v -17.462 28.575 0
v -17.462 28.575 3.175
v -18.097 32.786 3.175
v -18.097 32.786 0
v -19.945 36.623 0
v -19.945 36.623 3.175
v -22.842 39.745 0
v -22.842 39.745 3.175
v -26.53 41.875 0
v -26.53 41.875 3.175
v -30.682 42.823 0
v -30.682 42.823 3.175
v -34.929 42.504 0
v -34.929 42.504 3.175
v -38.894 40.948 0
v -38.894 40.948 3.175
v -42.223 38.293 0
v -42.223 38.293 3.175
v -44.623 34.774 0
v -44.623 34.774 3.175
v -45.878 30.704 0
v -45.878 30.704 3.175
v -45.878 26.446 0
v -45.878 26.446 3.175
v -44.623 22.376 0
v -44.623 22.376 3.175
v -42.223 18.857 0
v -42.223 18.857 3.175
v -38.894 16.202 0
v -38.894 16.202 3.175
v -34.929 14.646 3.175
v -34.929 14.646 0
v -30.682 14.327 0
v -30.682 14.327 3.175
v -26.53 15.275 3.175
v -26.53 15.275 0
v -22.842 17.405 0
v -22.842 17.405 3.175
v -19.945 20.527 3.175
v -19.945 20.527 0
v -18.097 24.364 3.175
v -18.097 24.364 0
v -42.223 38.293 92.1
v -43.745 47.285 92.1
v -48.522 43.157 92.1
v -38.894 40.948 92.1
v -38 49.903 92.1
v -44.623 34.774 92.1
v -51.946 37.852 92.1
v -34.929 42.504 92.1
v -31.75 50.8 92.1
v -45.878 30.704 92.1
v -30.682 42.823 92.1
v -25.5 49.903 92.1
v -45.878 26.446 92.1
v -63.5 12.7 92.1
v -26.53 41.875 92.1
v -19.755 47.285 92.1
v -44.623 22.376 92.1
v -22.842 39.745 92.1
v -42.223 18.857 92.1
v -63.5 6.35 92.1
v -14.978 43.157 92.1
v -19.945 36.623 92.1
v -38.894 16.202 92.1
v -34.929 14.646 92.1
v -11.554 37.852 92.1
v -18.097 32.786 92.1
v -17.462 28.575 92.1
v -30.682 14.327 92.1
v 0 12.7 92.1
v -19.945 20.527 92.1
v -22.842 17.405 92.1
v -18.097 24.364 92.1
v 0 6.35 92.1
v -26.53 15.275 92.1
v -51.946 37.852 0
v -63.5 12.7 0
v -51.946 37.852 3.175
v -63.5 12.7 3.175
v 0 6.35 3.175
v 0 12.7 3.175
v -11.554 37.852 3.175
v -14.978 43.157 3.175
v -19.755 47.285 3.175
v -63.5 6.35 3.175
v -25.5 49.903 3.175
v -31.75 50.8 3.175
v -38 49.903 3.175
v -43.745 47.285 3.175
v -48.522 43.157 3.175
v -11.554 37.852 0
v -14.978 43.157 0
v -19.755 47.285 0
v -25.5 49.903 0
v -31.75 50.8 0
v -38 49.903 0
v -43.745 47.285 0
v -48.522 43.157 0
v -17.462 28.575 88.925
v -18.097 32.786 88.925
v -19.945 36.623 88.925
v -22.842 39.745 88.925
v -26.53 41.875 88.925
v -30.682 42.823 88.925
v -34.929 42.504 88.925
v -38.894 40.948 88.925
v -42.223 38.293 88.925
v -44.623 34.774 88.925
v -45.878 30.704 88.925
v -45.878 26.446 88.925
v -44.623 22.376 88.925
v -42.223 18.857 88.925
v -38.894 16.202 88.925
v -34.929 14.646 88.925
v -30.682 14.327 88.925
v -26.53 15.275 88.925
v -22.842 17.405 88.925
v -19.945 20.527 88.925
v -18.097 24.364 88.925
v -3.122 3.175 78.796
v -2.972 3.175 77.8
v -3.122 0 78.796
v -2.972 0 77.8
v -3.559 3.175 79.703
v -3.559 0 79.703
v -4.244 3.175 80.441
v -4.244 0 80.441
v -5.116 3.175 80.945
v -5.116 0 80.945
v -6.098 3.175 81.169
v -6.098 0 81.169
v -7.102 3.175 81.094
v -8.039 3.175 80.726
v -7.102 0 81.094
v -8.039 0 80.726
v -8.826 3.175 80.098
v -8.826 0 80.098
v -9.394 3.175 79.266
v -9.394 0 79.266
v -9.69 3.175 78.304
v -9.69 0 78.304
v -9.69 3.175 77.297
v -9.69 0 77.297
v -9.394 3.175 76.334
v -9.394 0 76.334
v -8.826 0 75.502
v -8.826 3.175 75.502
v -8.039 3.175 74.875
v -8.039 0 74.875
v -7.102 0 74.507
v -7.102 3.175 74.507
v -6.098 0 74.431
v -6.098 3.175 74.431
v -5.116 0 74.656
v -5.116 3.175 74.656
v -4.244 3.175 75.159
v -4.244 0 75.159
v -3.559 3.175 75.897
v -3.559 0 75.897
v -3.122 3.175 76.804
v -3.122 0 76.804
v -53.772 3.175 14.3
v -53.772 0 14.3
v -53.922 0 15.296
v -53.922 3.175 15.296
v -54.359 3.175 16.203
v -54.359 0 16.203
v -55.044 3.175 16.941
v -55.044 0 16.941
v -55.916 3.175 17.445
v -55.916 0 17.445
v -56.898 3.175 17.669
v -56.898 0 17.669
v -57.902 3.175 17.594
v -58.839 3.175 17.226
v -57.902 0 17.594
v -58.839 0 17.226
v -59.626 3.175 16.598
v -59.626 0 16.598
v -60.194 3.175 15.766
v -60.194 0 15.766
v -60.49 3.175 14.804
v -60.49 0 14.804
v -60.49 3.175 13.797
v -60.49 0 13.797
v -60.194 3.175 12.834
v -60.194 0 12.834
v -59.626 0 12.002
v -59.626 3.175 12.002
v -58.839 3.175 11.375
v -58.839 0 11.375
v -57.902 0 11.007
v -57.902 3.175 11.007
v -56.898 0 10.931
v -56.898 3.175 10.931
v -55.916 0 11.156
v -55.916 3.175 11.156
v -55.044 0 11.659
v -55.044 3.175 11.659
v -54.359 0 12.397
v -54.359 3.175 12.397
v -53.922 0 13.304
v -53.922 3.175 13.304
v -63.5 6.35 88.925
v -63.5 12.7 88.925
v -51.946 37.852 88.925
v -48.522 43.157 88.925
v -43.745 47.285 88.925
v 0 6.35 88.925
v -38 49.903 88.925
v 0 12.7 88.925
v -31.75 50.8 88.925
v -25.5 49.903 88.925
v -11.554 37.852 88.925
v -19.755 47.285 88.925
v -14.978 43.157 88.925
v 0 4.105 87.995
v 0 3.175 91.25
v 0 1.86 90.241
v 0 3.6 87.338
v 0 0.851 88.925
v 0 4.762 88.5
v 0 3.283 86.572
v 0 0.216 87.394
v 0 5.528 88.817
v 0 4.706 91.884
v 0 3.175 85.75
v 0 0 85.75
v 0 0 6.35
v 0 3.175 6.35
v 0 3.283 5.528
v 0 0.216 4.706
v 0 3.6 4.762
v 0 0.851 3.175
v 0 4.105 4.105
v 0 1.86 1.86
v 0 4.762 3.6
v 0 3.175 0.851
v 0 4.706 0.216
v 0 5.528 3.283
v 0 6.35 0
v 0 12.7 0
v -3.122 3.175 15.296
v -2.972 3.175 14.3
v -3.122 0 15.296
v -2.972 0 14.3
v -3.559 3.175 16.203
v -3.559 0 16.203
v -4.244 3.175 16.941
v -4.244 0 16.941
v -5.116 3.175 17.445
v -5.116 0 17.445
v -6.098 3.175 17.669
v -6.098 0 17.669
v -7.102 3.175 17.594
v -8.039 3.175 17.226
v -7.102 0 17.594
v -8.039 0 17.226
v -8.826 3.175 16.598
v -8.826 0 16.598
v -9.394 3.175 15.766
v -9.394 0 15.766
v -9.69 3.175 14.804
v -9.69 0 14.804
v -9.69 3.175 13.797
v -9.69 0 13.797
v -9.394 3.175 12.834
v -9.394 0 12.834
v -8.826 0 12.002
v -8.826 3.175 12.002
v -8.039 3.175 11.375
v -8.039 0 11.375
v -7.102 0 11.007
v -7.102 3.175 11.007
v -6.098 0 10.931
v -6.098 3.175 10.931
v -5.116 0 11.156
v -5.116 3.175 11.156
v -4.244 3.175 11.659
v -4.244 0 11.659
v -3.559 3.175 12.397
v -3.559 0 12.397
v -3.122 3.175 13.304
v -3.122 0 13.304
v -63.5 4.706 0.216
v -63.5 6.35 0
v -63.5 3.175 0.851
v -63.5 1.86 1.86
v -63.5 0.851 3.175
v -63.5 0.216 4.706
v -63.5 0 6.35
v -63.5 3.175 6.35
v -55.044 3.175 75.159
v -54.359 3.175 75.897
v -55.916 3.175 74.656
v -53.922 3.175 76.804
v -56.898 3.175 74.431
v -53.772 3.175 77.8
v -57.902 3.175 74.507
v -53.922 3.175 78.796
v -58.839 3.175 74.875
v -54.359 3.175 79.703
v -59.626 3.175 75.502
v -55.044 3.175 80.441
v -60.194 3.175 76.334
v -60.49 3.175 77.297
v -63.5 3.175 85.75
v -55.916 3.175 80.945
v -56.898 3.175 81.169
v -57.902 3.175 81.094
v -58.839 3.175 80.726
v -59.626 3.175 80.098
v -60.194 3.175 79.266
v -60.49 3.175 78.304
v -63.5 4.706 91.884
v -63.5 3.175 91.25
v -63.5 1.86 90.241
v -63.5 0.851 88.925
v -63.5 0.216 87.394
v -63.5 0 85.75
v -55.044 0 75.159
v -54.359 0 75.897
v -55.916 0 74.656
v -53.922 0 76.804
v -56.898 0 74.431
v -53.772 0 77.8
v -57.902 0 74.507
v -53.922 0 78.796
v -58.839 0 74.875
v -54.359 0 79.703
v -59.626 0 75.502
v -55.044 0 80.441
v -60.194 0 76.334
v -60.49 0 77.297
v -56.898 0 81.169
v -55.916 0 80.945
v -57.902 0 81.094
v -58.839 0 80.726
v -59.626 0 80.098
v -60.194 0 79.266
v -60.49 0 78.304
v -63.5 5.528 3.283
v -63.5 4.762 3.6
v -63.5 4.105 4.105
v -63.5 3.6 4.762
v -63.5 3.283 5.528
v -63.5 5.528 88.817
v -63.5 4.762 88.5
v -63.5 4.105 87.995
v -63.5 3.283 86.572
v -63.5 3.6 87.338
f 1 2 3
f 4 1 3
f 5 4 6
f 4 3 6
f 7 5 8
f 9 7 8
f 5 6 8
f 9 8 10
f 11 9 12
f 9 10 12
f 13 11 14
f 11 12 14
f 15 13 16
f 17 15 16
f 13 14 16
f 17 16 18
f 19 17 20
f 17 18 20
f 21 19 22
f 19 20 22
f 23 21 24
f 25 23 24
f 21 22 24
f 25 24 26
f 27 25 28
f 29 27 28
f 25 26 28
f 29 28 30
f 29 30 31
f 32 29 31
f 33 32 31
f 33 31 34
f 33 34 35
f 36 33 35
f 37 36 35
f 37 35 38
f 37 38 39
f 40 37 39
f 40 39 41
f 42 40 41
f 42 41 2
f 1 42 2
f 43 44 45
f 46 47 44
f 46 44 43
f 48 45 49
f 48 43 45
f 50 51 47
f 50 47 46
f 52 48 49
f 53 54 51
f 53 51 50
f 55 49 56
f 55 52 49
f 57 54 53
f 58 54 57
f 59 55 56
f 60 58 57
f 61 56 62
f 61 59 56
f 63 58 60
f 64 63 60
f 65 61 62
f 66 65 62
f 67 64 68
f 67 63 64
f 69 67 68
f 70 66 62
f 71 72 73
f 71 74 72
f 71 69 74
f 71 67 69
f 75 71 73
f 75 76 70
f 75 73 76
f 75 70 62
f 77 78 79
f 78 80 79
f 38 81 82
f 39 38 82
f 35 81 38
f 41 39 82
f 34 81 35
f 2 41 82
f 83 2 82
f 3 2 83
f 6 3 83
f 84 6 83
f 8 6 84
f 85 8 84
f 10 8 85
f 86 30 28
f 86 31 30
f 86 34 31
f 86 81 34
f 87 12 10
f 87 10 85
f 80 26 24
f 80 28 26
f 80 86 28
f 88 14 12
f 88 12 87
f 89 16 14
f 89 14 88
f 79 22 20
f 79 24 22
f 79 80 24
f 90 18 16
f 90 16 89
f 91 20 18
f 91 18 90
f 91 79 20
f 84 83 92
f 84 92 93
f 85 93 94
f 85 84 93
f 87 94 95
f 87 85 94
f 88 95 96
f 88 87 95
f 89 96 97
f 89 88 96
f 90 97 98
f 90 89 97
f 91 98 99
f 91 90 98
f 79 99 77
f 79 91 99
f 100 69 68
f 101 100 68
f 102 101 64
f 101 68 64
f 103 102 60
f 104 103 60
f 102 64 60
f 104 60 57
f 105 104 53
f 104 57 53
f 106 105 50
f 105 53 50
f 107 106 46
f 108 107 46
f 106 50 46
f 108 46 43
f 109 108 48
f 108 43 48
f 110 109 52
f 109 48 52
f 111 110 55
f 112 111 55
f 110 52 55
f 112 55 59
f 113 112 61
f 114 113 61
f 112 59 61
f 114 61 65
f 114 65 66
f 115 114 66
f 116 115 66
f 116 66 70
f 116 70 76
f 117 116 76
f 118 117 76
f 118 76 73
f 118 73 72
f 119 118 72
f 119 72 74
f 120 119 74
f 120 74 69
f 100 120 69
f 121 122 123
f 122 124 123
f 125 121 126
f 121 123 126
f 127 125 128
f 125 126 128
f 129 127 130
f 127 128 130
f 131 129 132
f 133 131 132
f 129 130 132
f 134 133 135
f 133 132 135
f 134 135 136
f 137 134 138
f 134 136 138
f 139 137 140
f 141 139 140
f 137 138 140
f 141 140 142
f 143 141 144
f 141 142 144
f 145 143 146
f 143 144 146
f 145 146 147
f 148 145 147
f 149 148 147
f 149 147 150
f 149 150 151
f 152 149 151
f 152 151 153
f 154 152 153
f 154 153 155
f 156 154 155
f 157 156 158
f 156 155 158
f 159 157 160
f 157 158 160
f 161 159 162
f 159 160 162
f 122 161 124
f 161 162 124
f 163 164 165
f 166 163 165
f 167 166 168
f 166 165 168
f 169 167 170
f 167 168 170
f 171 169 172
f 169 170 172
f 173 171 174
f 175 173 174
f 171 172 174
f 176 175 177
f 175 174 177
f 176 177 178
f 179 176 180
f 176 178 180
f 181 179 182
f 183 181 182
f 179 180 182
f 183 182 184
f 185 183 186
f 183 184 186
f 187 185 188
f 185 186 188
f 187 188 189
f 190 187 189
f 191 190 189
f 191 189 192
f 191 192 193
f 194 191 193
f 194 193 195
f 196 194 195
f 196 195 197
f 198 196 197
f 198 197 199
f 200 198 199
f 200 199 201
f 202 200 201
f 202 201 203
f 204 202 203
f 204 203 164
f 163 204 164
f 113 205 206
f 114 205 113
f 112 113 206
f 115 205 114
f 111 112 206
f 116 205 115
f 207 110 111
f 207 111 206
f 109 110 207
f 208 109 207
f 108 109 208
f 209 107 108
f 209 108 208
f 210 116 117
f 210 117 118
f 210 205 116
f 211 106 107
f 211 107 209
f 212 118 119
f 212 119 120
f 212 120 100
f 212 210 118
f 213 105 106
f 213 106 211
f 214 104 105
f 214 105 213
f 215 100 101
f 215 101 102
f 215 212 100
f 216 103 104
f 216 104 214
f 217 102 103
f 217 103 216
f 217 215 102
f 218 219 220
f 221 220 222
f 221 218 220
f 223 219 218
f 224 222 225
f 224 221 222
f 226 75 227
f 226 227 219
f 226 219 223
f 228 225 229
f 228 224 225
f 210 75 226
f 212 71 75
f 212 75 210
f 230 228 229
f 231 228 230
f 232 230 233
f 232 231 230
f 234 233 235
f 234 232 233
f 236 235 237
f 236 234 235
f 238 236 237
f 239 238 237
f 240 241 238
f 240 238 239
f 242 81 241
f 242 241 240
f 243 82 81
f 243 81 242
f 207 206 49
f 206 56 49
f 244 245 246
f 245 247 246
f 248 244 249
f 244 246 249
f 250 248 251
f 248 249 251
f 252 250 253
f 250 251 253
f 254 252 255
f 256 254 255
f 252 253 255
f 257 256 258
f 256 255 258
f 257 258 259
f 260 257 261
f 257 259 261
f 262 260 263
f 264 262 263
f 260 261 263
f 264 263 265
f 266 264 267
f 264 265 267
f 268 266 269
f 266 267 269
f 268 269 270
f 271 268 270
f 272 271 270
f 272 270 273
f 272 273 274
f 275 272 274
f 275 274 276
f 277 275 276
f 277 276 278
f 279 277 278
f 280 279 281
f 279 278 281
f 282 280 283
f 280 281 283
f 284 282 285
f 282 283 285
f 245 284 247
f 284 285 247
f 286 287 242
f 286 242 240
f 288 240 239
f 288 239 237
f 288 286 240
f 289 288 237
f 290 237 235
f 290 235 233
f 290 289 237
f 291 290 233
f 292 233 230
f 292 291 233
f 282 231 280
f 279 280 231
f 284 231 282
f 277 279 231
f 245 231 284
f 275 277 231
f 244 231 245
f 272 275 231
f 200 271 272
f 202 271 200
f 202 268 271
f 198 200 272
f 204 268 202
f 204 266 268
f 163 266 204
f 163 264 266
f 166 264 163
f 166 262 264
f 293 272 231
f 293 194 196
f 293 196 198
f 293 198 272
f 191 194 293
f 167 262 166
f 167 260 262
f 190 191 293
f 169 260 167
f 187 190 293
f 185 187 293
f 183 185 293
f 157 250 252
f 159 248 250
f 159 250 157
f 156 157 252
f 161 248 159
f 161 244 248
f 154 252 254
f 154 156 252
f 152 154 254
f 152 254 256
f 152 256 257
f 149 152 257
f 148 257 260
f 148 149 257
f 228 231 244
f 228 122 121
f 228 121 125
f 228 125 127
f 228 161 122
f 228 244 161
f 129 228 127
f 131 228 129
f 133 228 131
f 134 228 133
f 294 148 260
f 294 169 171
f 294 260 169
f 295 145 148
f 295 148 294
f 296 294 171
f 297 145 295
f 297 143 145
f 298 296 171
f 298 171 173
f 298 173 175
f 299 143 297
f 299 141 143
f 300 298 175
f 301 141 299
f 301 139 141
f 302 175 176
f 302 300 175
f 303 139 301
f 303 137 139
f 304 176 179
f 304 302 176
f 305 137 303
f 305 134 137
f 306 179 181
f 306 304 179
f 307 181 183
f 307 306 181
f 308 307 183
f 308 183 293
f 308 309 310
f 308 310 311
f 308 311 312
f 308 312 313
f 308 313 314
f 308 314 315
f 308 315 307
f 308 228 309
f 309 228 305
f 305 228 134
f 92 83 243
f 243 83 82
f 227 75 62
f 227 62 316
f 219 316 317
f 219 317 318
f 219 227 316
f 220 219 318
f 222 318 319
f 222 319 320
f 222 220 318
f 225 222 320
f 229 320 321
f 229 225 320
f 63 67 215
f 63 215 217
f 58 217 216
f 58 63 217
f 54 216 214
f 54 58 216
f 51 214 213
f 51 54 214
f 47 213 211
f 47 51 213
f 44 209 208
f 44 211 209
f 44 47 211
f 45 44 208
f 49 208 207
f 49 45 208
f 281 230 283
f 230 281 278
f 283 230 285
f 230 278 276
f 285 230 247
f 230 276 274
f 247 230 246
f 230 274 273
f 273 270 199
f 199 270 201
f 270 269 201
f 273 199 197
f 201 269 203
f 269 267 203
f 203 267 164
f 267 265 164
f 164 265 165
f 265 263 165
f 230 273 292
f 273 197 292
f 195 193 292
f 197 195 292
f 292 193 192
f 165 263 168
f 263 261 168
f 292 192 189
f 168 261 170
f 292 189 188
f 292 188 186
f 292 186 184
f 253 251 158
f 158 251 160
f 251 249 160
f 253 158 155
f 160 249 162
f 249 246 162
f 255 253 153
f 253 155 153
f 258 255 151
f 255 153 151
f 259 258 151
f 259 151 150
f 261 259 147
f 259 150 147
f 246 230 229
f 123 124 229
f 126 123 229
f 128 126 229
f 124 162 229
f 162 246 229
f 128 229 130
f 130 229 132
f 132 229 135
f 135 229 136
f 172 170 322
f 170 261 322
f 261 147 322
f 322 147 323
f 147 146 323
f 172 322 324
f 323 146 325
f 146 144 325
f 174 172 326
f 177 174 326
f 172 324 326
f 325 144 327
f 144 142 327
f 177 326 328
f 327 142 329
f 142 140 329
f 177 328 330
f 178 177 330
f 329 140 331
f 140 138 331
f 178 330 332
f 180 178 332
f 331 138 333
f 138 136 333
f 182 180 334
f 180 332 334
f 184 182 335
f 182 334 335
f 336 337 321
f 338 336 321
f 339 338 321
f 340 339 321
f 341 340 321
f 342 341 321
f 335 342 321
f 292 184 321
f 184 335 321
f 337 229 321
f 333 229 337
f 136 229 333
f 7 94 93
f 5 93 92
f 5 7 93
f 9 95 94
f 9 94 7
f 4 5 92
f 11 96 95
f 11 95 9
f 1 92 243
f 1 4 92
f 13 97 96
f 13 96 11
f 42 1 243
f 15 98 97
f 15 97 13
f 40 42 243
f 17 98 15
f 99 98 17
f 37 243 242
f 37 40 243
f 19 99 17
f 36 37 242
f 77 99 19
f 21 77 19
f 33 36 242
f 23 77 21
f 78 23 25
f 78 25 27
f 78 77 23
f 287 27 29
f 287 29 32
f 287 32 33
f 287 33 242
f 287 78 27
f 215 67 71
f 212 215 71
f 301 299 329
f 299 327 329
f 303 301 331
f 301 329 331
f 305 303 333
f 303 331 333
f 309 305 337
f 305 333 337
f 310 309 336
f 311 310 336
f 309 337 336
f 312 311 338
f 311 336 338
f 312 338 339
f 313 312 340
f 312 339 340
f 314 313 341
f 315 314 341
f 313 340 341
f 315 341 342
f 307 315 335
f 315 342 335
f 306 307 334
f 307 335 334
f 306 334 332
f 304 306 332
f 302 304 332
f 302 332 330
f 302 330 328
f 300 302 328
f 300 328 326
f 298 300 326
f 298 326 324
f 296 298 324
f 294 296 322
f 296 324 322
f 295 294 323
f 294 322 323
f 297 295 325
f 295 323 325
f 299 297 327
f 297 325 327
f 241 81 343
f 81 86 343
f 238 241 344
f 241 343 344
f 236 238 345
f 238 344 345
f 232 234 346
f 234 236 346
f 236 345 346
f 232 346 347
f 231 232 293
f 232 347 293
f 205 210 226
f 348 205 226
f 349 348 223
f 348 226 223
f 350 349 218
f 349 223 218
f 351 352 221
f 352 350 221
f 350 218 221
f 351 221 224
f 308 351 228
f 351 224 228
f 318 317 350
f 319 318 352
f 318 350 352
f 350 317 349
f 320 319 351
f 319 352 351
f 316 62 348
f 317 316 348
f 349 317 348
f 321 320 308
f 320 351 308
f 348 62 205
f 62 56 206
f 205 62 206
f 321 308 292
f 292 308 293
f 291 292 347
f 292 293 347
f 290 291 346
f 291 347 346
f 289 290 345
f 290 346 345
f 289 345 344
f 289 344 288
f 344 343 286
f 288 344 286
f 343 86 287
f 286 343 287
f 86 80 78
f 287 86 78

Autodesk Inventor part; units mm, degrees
ref_plane "YZ Plane" through (0, 0, 0) normal (1, 0, 0) x (0, 1, 0)
ref_plane "XZ Plane" through (0, 0, 0) normal (0, 1, 0) x (-1, 0, 0)
ref_plane "XY Plane" through (0, 0, 0) normal (0, 0, 1) x (1, 0, 0)
sketch "Sketch1" plane through (0, 0, 0) normal (0, 1, 0) x (-1, 0, 0)
  line L0 (0, 0) -> (63.5, 0)
  line L1 (63.5, 0) -> (63.5, 92.1004)
  line L2 (63.5, 92.1004) -> (0, 92.1004)
  line L3 (0, 92.1004) -> (0, 0)
  dimension "d0" = 92.1004
  dimension "d2" = 63.5
extrude "Plate1" add sketch "Sketch1" along normal blind 3.175
sketch "Sketch2" plane through (0, 0, 88.9254) normal (0, 0, 1) x (1, 0, 0)
  line L0 (-63.5, 0) -> (0, 0)
  line L1 (0, 0) -> (0, 50.8)
  line L2 (0, 50.8) -> (-63.5, 50.8)
  line L3 (-63.5, 50.8) -> (-63.5, 0)
edge flange "Flange1" height 50.8 angle 90 thickness 3.175 bend radius 3.175 thickness toward (0, 0, 1) relief tear relief width 3.175 relief depth 1.5875 corner gap 3.175 corner form 0 edges at (-31.75, 3.175, 92.1004) (-31.75, 3.175, 0) wall of the first edge with corners at (-63.5, 0, 88.9254) (0, 0, 88.9254) (0, 50.8, 88.9254) (-63.5, 50.8, 88.9254)
bend "Bend1"
corner "Corner1"
sketch "Sketch3" plane through (-63.5, 50.8, 92.1004) normal (0, 0, 1) x (1, 0, 0)
  line L0 (0, -44.45) -> (63.5, -44.45) projected
  line L1 (63.5, 0) -> (63.5, -44.45) projected
  line L2 (0, 0) -> (63.5, 0) projected
  line L3 (0, -44.45) -> (0, 0) projected
  circle A0 centre (31.75, -22.225) radius 14.2875
  arc A1 (51.9461, -12.9478) -> (11.5539, -12.9478) centre (31.75, -22.225) ccw
  line L4 (0, -38.1) -> (11.5539, -12.9478)
  line L5 (51.9461, -12.9478) -> (63.5, -38.1)
  point P0 (63.5, -50.8)
  dimension "d14" = 28.575
  dimension "d15" = 6.35
  dimension "d16" = 28.575
  dimension "d17" = 44.45
  dimension "d18" = 31.75
  dimension "d19" = 6.35
extrude "Cut1" cut sketch "Sketch3" against normal blind 2540 contours L3 L2 A1 L4 | L5 A1 L2 L1 | A0
sketch "Sketch4" plane through (0, 0, 0) normal (0, -1, 0) x (1, 0, 0)
  line L0 (0, 85.7504) -> (0, 6.35) projected
  line L1 (-63.5, 6.35) -> (-63.5, 85.7504) projected
  circle A0 centre (-57.15, 77.8002) radius 3.3782
  circle A1 centre (-6.35, 77.8002) radius 3.3782
  circle A2 centre (-57.15, 14.3002) radius 3.3782
  circle A3 centre (-6.35, 14.3002) radius 3.3782
  line L2 (-63.5, 46.0502) -> (0, 46.0502)
  point P0 (0, 0)
  dimension "d22" = 6.7564
  dimension "d23" = 6.7564
  dimension "d24" = 6.7564
  dimension "d25" = 6.7564
  dimension "d26" = 31.75
  dimension "d27" = 31.75
  dimension "d28" = 31.75
  dimension "d29" = 31.75
  dimension "d30" = 6.35
  dimension "d31" = 6.35
  dimension "d32" = 6.35
  dimension "d33" = 6.35
extrude "Cut2" cut sketch "Sketch4" against normal blind 3.175
equation "\"d34\" = Thickness"
equation "\"d4\" = BendReliefWidth"
equation "\"d5\" = BendReliefDepth"
equation "\"d6\" = MinimumRemnant"
equation "\"d7\" = BendRadius"
equation "\"d10\" = BendRadius"
equation "\"d11\" = CornerReliefSize"
equation "\"d12\" = GapSize"
equation "\"d13\" = JacobiRadiusSize"
equation "\"BendRadius\" = Thickness"
equation "\"BendReliefWidth\" = Thickness"
equation "\"BendReliefDepth\" = 0.5 * Thickness"
equation "\"CornerReliefSize\" = 4 * Thickness"
equation "\"MinimumRemnant\" = 2 * Thickness"
equation "\"TransitionRadius\" = BendRadius"
equation "\"JacobiRadiusSize\" = BendRadius"
equation "\"GapSize\" = Thickness"
equation "\"d3\" = BendRadius"
equation "\"Thickness\" = 3.175"
properties part number "Bearing Mount 5" material "Aluminum 6061"
